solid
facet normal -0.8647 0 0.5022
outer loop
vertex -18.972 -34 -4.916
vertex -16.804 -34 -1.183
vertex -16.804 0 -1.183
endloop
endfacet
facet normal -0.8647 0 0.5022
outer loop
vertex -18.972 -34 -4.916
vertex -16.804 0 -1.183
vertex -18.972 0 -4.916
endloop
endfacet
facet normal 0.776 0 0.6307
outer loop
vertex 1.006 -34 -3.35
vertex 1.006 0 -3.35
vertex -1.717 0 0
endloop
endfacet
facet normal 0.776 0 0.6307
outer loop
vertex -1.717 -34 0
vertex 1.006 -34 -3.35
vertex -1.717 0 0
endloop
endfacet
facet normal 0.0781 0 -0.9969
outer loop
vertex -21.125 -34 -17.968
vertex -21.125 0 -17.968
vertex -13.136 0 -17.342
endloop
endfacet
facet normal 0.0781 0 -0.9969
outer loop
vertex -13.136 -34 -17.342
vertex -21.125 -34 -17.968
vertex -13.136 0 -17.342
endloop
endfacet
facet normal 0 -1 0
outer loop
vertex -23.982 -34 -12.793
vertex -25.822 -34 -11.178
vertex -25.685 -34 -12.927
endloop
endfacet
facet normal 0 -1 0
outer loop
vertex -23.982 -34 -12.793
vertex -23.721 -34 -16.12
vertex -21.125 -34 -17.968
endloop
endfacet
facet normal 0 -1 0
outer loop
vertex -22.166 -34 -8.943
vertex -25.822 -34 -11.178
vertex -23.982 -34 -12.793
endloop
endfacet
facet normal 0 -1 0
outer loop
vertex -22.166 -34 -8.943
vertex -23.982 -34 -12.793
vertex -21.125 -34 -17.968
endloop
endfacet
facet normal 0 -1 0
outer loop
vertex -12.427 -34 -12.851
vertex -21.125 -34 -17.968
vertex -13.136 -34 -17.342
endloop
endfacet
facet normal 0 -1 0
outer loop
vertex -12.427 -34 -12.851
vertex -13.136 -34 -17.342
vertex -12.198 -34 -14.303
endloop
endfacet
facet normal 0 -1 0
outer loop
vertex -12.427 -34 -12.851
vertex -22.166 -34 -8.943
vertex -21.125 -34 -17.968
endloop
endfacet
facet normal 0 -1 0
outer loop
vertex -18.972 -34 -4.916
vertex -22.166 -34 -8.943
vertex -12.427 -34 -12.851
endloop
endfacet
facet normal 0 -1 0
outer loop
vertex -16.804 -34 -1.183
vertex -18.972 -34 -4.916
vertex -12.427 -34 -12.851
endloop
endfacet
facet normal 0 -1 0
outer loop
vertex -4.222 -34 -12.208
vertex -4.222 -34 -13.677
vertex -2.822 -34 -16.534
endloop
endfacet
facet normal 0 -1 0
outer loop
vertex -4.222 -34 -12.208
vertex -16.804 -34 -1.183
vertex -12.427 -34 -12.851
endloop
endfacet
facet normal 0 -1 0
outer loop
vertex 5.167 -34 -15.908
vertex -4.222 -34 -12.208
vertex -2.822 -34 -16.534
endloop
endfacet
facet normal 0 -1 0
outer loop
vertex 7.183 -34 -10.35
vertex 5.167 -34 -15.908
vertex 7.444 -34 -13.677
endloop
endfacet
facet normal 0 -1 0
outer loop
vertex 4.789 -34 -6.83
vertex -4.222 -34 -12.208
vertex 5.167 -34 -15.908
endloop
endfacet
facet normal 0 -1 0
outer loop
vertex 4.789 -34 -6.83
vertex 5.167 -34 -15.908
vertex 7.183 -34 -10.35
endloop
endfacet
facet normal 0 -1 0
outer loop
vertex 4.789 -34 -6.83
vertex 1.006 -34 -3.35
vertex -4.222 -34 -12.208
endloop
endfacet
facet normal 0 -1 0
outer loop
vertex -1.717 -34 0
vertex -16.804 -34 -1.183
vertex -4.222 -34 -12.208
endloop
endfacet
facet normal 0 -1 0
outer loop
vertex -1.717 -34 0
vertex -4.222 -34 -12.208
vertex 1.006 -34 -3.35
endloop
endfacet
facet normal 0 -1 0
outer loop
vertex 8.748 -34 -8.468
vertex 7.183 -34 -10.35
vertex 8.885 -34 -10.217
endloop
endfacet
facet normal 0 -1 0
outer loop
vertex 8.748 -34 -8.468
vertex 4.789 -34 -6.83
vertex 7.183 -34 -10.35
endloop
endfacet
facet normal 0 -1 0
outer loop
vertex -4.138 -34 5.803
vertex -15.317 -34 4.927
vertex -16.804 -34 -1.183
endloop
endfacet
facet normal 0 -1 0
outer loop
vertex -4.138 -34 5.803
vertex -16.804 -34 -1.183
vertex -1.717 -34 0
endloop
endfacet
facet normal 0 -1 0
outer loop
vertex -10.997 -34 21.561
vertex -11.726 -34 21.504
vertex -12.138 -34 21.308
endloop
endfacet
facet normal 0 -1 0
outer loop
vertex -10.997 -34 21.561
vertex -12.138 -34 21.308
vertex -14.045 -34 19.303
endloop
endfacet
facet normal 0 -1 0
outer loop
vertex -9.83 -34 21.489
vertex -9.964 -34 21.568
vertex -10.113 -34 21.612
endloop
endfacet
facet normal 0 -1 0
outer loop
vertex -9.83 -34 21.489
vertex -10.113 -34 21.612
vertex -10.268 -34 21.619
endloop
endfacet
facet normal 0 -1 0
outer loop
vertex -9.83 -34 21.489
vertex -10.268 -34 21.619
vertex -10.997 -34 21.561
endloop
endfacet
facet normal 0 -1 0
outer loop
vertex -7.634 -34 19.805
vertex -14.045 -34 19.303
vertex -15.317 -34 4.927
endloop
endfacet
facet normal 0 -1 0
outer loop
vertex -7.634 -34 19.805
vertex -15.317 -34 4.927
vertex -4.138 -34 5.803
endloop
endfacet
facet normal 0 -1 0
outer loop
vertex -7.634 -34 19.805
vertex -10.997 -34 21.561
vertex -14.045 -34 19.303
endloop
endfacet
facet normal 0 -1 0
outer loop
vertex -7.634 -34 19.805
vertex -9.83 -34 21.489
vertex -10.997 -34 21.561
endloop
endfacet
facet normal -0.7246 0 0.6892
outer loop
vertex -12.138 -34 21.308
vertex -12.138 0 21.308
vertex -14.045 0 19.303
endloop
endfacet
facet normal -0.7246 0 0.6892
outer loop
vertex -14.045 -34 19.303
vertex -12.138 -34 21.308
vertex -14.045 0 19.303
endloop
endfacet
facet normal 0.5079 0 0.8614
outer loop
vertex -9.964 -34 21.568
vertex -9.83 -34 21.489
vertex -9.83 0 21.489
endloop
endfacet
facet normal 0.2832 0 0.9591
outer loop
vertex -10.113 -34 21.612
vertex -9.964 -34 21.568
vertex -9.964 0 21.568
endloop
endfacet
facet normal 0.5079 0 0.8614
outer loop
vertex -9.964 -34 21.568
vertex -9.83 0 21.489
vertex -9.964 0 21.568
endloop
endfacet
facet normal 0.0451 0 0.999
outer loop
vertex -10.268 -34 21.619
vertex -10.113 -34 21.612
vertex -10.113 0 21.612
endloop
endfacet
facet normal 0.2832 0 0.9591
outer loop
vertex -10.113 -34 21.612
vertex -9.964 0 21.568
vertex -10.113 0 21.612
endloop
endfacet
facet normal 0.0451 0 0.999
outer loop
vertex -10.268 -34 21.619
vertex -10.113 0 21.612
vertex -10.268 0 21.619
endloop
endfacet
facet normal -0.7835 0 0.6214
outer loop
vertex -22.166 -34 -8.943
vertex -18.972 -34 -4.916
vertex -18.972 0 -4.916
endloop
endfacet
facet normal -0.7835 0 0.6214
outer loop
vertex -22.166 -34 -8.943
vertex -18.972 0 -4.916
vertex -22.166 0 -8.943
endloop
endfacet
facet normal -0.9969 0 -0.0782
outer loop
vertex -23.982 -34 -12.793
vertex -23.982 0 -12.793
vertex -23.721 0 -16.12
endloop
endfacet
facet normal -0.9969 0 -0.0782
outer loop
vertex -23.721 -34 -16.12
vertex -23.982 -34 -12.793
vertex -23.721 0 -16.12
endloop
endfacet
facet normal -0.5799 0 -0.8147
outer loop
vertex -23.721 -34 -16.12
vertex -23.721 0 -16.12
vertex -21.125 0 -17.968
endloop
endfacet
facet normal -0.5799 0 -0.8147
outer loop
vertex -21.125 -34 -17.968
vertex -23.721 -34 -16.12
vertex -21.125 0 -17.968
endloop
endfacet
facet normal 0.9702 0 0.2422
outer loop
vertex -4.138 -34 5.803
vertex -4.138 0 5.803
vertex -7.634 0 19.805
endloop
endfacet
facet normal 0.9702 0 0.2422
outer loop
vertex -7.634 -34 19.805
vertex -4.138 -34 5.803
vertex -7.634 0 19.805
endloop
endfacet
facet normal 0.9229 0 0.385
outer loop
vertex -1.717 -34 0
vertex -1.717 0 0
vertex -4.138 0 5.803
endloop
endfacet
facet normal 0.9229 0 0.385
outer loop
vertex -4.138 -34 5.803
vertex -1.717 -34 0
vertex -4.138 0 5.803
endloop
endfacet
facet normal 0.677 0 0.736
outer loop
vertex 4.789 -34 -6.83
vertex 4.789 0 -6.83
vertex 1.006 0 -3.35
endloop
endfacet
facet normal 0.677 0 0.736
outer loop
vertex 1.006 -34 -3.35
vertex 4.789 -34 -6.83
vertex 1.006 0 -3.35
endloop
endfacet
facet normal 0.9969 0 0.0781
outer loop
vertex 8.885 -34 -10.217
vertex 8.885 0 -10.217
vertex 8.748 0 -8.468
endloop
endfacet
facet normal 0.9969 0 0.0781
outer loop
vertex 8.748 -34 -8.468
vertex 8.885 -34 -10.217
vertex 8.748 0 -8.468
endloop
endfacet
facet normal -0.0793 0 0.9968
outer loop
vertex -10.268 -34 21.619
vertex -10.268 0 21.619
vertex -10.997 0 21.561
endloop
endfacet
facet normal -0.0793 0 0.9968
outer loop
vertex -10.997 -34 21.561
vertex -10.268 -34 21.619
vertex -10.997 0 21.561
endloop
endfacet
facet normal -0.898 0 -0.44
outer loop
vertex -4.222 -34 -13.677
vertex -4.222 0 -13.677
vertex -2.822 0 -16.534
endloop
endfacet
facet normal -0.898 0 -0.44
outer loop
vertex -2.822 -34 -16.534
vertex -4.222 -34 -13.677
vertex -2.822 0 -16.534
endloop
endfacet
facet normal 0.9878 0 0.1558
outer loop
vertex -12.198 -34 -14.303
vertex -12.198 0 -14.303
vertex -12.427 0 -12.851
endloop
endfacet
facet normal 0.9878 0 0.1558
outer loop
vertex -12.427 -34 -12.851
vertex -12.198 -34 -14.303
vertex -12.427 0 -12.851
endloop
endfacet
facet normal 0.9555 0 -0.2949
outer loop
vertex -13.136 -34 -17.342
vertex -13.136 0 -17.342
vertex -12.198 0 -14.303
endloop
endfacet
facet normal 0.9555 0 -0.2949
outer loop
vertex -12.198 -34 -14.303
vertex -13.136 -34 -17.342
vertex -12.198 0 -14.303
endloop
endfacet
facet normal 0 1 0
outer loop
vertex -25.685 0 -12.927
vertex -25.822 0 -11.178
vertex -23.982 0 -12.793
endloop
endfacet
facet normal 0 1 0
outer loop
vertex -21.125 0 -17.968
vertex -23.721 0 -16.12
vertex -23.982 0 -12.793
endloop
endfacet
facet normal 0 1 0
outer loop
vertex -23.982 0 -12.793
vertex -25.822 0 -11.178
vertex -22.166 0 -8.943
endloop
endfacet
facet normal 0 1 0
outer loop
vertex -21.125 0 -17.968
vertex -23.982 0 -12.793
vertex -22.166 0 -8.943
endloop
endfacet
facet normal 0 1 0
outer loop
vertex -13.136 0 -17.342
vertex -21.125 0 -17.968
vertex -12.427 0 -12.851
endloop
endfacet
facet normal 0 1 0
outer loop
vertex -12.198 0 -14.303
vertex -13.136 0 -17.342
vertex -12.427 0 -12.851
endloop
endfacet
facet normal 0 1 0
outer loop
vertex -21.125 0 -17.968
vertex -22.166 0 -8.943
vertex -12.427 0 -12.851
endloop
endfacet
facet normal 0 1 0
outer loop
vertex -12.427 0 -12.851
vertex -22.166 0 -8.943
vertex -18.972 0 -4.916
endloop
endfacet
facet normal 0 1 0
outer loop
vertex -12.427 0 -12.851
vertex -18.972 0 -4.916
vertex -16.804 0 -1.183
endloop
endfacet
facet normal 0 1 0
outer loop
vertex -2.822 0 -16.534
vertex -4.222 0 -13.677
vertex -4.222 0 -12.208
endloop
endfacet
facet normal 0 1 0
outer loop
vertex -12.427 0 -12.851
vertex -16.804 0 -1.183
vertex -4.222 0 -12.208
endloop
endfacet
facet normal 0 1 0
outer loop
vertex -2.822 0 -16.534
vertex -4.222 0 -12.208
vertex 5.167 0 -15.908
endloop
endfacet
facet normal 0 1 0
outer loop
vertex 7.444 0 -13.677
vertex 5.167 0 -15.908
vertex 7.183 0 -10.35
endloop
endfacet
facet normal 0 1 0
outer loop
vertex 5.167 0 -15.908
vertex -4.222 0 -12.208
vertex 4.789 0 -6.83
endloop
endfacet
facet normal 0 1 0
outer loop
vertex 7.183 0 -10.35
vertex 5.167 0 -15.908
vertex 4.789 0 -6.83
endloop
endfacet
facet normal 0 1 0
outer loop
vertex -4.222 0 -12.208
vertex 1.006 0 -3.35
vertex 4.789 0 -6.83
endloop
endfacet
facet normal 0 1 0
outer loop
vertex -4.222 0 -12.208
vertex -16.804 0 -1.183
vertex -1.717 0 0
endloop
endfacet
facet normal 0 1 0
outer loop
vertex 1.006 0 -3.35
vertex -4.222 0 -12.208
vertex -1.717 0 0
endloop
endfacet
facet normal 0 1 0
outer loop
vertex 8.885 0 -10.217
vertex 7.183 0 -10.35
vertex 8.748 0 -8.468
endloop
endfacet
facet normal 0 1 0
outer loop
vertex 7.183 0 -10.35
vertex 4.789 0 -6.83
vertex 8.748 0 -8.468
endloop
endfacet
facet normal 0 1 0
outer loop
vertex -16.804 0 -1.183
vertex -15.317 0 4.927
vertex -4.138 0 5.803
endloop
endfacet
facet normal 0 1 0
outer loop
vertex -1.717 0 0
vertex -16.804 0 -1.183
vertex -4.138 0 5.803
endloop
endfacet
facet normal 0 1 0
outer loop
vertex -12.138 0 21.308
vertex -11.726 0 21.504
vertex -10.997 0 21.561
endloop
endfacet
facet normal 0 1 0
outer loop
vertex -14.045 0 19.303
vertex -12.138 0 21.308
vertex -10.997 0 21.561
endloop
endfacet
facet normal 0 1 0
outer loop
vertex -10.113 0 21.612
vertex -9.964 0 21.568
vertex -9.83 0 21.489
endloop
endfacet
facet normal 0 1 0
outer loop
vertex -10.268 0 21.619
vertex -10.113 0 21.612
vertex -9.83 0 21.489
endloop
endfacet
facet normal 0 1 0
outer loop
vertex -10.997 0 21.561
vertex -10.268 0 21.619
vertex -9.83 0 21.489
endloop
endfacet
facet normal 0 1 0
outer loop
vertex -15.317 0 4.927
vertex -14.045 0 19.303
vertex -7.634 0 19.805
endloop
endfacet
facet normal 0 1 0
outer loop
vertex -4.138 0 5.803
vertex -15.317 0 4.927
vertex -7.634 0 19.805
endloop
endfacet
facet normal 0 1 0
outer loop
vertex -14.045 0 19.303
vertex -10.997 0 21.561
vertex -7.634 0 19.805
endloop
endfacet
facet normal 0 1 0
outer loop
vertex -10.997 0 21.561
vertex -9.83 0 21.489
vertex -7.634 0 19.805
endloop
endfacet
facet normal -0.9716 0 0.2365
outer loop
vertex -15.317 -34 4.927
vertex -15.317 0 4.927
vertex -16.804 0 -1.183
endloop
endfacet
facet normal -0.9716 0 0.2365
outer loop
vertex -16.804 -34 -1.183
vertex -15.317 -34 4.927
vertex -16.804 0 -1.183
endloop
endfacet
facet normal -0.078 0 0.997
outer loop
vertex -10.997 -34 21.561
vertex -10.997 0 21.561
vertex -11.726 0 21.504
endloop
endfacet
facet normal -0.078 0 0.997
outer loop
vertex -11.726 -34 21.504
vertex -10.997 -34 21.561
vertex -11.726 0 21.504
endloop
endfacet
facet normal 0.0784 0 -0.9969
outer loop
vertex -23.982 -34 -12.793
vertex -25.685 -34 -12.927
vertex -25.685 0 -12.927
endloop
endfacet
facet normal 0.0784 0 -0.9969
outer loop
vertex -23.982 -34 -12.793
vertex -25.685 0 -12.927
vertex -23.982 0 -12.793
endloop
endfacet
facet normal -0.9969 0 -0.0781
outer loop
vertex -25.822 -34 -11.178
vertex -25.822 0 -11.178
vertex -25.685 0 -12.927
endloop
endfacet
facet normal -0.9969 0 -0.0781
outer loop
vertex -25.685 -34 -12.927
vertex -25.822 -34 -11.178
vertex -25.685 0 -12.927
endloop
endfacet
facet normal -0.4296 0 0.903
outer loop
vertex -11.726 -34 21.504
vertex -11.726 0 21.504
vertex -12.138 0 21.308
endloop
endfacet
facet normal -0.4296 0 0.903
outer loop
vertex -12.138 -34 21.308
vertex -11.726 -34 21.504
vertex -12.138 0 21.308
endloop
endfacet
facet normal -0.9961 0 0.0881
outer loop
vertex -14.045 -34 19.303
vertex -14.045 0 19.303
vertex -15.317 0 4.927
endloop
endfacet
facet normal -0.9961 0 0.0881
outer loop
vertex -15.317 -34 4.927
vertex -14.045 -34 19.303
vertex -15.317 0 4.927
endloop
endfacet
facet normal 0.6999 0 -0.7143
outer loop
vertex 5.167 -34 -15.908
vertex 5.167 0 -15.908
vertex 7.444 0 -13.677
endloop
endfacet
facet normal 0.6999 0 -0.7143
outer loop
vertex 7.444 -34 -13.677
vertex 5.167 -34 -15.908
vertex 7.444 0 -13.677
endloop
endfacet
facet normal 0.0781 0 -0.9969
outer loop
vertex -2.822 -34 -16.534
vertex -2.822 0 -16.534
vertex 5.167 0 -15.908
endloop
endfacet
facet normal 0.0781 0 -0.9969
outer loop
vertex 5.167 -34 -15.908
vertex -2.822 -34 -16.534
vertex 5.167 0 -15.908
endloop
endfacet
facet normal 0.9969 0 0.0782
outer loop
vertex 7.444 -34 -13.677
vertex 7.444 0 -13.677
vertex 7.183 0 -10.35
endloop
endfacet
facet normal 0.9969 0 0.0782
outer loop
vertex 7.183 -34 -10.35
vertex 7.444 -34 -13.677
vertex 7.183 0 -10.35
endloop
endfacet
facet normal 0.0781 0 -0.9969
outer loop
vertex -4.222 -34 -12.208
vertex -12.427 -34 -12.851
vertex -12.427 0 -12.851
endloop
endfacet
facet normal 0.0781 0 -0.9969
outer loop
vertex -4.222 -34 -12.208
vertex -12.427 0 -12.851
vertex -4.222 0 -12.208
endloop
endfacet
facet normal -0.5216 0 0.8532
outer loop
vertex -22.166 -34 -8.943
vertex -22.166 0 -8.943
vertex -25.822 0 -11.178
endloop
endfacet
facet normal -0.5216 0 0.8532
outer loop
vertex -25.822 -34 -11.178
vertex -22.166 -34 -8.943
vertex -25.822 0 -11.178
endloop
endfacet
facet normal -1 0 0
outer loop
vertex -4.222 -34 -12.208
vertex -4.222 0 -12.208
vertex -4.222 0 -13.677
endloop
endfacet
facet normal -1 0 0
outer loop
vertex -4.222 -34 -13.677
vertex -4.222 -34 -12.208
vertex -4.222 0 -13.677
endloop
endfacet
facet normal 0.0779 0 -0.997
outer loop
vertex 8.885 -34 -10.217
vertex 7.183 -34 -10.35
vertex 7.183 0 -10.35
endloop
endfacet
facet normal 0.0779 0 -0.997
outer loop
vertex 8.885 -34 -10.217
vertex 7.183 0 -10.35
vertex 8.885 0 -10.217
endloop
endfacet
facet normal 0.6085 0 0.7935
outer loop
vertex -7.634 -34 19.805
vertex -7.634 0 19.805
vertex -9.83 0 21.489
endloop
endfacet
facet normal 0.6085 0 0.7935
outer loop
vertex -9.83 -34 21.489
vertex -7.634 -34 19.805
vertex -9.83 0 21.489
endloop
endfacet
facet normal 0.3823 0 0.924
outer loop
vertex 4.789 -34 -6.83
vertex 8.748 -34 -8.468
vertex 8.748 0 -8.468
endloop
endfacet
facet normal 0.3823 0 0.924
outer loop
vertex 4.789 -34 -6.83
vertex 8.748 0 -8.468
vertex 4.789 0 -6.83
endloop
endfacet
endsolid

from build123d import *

# Parameters (mm, degrees)
F1_DEPTH = 34


with BuildPart() as f1:
    # F0 (on Front) → F1 (new body)
    with BuildSketch(Plane.XZ):
        with BuildLine():
            Line((-12.198149, -14.302597), (-12.427167, -12.850712))
            Line((-12.427167, -12.850712), (-4.222136, -12.207562))
            Line((-4.222136, -12.207562), (-4.222136, -13.677399))
            Line((-4.222136, -13.677399), (-2.822079, -16.533816))
            Line((-2.822079, -16.533816), (5.16684, -15.907606))
            Line((5.16684, -15.907606), (7.443612, -13.677399))
            Line((7.443612, -13.677399), (7.182818, -10.35031))
            Line((7.182818, -10.35031), (8.885174, -10.216871))
            Line((8.885174, -10.216871), (8.748127, -8.468476))
            Line((8.748127, -8.468476), (4.78861, -6.830055))
            Line((4.78861, -6.830055), (1.006297, -3.350328))
            Line((1.006297, -3.350328), (-1.716968, 0))
            Line((-1.716968, 0), (-4.137649, 5.802869))
            Line((-4.137649, 5.802869), (-7.634035, 19.805321))
            Line((-7.634035, 19.805321), (-9.829951, 21.48903))
            ThreePointArc((-9.829951, 21.48903), (-10.036781, 21.594364), (-10.267614, 21.618659))
            Line((-10.267614, 21.618659), (-10.99684, 21.561499))
            Line((-10.99684, 21.561499), (-11.726065, 21.504339))
            Line((-11.726065, 21.504339), (-12.138186, 21.308099))
            Line((-12.138186, 21.308099), (-14.04494, 19.302804))
            Line((-14.04494, 19.302804), (-15.316869, 4.926588))
            Line((-15.316869, 4.926588), (-16.803827, -1.182581))
            Line((-16.803827, -1.182581), (-18.97181, -4.916308))
            Line((-18.97181, -4.916308), (-22.165744, -8.942867))
            Line((-22.165744, -8.942867), (-25.821616, -11.178218))
            Line((-25.821616, -11.178218), (-25.684568, -12.926614))
            Line((-25.684568, -12.926614), (-23.982212, -12.793175))
            Line((-23.982212, -12.793175), (-23.721419, -16.120264))
            Line((-23.721419, -16.120264), (-21.124961, -17.968484))
            Line((-21.124961, -17.968484), (-13.136041, -17.342274))
            Line((-13.136041, -17.342274), (-12.198149, -14.302597))
        make_face()
    extrude(amount=F1_DEPTH)


solid = f1.part
